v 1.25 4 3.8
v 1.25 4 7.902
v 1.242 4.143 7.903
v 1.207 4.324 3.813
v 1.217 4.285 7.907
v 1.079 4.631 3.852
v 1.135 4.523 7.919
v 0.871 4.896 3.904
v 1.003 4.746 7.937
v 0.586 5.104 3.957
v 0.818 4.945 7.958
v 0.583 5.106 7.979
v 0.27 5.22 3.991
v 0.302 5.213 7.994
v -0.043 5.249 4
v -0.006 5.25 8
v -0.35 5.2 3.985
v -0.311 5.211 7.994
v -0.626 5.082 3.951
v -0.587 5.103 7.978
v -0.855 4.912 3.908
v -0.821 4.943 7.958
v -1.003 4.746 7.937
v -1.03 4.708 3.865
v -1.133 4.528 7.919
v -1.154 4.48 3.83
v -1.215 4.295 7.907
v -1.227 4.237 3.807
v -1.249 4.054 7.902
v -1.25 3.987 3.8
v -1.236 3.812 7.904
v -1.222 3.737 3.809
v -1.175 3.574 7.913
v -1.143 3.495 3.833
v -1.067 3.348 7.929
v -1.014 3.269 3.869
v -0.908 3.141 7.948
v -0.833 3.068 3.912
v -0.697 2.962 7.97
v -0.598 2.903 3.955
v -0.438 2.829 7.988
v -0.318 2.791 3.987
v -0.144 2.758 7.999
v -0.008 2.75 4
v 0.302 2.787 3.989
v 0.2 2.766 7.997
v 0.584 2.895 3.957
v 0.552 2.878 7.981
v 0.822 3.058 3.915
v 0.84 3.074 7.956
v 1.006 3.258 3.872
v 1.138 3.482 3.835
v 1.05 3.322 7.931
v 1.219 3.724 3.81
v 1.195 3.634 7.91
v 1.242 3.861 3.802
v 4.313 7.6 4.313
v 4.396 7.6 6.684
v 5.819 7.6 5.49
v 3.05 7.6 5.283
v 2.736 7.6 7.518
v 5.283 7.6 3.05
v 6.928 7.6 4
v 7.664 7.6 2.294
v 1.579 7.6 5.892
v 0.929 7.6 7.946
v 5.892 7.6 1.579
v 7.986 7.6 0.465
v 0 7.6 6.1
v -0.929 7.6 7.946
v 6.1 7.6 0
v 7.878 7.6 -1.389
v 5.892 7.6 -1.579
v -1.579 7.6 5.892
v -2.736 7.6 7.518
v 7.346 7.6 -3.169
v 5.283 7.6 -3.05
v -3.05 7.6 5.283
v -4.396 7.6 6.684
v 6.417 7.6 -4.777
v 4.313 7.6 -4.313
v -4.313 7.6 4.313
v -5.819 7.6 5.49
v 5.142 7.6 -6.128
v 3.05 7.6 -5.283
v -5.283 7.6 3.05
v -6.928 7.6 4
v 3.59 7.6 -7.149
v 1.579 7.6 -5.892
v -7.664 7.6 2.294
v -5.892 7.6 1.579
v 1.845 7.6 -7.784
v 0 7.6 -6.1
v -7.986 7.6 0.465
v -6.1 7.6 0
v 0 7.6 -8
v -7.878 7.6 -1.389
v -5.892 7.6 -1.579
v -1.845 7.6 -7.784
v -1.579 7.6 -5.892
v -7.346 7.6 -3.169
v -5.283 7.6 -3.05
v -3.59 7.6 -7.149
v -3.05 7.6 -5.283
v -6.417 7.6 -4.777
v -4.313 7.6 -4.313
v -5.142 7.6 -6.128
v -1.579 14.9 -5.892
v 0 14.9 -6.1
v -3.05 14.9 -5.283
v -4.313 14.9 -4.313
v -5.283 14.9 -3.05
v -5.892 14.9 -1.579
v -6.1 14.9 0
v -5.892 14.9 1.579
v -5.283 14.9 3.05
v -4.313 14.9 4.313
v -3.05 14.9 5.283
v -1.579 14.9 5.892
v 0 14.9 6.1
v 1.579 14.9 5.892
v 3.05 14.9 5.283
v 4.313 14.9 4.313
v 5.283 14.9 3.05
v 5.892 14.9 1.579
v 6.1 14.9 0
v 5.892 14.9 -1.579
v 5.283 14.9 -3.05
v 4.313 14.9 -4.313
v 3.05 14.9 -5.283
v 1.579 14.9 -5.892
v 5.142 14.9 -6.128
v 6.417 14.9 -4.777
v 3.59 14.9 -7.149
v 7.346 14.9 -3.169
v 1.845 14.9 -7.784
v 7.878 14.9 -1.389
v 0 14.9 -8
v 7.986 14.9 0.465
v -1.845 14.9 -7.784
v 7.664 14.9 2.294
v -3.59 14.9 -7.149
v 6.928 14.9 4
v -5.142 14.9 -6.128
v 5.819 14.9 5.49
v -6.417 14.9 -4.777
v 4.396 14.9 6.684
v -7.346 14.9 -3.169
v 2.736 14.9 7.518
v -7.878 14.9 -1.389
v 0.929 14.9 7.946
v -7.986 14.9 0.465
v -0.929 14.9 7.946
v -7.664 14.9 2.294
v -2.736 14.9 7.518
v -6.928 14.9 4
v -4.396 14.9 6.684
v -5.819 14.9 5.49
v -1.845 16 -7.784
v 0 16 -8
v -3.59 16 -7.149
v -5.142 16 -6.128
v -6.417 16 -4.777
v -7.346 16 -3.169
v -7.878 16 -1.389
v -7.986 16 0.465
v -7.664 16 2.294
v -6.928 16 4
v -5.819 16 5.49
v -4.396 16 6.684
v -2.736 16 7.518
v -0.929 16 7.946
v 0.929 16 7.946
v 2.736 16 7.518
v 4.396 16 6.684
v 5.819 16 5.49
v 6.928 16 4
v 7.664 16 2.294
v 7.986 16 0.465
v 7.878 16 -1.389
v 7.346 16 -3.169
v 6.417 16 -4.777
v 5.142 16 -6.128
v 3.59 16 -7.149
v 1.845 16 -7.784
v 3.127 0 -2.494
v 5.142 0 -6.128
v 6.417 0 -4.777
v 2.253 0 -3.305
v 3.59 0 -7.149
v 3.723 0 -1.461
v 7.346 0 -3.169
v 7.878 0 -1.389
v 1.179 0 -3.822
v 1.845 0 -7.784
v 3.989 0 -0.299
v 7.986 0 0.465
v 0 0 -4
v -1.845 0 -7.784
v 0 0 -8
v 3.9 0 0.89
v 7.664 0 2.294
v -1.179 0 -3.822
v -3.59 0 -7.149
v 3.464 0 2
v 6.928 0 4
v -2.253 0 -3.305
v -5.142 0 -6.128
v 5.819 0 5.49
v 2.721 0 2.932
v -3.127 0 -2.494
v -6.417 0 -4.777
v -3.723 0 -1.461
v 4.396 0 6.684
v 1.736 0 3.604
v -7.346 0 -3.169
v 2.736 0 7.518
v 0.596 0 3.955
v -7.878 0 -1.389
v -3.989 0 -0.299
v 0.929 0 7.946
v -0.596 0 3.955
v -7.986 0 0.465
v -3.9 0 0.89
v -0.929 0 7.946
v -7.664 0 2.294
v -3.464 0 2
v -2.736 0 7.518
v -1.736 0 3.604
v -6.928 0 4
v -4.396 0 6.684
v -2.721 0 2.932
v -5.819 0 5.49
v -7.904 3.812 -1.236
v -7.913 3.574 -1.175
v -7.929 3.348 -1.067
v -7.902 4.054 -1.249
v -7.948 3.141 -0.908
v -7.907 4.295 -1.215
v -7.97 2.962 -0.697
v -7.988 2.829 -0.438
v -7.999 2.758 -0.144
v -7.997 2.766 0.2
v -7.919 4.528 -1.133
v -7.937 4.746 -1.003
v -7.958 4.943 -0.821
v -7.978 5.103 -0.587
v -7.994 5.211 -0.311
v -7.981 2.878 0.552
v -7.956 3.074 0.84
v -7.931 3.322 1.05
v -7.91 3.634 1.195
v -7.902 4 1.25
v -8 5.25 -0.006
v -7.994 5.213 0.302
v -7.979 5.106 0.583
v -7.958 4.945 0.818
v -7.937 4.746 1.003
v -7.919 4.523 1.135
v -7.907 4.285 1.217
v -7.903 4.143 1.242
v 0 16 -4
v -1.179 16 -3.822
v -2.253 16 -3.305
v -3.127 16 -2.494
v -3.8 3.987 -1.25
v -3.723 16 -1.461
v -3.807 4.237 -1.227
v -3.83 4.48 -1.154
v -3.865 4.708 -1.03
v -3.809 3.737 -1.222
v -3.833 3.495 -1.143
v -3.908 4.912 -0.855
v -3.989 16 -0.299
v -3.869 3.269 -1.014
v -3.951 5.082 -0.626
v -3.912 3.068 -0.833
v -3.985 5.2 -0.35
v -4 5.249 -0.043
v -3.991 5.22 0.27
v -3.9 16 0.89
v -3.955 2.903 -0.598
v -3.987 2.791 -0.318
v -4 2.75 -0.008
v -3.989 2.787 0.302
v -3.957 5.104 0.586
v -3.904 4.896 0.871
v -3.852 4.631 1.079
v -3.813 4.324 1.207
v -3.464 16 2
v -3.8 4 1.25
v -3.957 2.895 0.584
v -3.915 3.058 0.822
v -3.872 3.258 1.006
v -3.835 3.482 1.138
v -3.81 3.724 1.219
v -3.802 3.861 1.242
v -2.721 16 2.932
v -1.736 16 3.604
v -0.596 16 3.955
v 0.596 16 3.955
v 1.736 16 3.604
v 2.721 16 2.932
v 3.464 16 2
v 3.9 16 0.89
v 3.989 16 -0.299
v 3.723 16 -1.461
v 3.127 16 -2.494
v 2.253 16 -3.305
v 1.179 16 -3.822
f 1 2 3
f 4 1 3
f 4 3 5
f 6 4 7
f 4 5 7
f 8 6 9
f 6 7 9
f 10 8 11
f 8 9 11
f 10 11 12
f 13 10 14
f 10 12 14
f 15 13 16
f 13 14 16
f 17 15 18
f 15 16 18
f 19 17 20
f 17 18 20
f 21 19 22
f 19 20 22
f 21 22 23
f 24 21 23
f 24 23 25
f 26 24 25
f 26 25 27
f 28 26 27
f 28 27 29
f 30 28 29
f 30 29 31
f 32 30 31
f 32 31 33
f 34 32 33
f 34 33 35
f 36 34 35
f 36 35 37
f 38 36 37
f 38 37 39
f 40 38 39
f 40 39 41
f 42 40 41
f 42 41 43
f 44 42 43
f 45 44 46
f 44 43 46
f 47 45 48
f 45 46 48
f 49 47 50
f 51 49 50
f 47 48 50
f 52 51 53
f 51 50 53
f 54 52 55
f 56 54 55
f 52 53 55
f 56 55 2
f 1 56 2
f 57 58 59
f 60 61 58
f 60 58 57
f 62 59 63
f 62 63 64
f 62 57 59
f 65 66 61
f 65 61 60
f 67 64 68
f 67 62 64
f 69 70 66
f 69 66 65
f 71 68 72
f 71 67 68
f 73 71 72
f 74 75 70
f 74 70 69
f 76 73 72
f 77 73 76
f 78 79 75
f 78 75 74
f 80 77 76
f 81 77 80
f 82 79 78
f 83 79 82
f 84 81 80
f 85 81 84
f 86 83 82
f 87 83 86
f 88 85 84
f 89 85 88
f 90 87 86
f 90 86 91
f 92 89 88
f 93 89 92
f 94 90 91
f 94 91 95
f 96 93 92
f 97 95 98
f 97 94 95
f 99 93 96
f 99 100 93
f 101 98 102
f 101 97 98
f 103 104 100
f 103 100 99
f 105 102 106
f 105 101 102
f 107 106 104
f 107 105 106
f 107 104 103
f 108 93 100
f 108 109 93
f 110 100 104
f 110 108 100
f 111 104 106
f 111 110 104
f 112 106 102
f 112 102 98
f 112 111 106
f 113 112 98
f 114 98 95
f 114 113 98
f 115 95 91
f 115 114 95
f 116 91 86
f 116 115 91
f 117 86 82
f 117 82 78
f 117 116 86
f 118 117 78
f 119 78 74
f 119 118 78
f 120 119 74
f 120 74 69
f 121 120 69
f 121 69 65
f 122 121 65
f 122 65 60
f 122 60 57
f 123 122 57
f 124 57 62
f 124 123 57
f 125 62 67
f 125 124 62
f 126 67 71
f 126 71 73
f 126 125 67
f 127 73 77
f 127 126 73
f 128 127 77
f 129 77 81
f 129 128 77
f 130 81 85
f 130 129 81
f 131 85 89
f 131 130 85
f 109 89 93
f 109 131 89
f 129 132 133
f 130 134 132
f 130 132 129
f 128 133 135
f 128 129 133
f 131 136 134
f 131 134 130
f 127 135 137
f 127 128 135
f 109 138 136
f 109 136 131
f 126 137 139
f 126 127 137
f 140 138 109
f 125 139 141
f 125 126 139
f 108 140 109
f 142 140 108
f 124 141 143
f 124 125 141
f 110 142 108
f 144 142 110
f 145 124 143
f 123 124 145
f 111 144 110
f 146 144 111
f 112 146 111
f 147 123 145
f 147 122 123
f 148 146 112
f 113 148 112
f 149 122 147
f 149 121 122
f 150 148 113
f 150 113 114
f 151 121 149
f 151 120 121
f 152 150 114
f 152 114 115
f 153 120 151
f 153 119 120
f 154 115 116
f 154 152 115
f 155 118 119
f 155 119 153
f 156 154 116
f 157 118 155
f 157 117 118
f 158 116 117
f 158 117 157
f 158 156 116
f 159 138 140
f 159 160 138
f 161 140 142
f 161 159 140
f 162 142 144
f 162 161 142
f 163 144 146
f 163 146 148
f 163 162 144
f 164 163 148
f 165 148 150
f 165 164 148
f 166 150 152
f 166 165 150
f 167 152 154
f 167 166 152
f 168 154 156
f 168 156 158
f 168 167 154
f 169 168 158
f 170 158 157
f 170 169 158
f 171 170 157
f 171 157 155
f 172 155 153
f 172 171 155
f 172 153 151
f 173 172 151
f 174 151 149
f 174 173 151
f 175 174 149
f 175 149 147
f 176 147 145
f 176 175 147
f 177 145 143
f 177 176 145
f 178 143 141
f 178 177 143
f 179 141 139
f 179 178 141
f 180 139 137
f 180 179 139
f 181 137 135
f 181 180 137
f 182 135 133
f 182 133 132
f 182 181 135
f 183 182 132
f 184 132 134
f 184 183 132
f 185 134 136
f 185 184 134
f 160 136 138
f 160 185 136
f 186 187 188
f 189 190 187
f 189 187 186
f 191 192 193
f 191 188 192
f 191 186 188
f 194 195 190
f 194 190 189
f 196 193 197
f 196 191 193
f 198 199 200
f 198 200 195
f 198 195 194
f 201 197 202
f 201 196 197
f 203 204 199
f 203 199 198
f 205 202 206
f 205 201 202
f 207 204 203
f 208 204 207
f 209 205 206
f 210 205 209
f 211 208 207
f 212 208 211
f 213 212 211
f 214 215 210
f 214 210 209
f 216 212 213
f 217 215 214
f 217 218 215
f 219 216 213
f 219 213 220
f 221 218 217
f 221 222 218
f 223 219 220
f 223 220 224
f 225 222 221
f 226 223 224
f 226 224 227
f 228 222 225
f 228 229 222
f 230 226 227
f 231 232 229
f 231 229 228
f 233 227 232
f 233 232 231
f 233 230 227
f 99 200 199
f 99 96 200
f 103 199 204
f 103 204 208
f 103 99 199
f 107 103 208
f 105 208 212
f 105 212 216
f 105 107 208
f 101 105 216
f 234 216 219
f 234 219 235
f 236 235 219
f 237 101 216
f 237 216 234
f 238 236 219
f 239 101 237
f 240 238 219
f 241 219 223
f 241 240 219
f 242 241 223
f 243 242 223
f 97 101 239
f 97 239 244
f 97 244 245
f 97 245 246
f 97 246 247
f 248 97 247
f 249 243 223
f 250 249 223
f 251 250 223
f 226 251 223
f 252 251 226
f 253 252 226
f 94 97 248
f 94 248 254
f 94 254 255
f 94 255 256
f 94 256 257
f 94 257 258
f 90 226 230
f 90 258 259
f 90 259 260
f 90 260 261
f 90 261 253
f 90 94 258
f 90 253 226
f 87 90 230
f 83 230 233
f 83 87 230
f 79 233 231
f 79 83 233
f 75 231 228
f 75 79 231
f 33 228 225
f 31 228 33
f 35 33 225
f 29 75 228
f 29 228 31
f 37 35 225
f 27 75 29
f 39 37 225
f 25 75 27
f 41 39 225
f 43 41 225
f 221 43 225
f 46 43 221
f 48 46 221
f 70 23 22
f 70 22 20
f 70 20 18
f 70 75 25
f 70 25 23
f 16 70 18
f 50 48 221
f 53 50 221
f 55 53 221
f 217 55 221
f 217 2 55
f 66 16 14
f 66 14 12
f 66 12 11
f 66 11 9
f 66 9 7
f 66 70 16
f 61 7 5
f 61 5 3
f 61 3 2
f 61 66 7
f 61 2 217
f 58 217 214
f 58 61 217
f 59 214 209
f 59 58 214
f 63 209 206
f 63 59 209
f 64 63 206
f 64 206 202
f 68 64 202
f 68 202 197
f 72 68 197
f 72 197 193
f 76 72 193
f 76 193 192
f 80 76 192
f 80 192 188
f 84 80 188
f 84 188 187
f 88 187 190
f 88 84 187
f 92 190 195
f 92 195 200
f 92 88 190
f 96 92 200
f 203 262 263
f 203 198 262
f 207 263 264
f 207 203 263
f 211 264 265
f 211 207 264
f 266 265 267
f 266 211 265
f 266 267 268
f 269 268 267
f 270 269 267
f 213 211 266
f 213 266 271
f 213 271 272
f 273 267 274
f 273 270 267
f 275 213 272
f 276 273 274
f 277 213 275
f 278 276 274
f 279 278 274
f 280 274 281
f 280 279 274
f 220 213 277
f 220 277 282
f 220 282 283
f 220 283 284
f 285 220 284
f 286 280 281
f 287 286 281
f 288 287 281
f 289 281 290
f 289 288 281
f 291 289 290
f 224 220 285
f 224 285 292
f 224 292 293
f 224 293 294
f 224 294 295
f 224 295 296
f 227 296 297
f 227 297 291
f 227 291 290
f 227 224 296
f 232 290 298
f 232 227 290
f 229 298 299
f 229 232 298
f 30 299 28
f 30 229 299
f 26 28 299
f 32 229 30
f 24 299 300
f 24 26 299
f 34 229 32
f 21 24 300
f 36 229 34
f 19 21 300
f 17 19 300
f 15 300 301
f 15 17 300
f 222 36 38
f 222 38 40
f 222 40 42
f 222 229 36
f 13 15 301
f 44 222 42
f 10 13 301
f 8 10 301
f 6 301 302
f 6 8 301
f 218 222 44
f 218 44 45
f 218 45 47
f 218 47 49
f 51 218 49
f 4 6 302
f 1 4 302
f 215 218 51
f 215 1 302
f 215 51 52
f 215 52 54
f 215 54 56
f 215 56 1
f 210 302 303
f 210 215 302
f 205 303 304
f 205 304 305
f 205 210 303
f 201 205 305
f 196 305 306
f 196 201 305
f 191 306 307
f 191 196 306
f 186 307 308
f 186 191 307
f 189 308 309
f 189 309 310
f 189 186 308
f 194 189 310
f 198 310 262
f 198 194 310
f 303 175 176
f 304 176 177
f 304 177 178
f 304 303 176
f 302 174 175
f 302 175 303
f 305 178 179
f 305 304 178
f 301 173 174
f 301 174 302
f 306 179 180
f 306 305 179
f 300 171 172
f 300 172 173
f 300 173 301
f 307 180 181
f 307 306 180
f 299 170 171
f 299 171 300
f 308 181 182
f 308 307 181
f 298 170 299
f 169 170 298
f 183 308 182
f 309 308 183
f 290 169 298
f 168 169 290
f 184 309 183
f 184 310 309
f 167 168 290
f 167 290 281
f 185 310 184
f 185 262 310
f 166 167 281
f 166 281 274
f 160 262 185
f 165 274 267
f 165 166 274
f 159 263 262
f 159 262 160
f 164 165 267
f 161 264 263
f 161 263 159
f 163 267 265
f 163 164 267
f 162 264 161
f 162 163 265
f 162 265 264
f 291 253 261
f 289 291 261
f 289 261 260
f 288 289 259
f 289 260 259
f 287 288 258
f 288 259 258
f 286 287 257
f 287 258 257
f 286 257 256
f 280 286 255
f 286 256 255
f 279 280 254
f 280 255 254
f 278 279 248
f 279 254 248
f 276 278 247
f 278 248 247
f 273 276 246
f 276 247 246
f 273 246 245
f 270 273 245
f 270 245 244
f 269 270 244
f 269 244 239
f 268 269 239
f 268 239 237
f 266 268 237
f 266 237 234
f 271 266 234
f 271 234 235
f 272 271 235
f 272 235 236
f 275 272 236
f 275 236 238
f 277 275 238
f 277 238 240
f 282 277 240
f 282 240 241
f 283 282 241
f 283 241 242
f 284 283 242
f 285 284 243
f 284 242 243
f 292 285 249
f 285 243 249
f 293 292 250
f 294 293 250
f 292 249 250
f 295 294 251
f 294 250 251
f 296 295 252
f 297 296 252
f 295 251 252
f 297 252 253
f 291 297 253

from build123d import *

# Parameters (mm, degrees)
M3_GEWINDEBOHRUNG1_REACH  = 26
M3_GEWINDEBOHRUNG1_BORE_R = 1.25
KREISMUSTER1_COUNT        = 2
KREISMUSTER1_ANGLE        = 90


with BuildPart() as part:
    # Skizze1 → Rotation1 (revolve)
    with BuildSketch(Plane.XY, mode=Mode.PRIVATE) as rotation1_sk:
        Polygon((-4, 16), (-4, 0), (-8, 0), (-8, 7.6), (-6.1, 7.6), (-6.1, 14.9), (-8, 14.9), (-8, 16), align=None)
    revolve(rotation1_sk.sketch.rotate(Axis((0, 0, 0), (0, 1, 0)), 270), axis=Axis((0, 0, 0), (0, 1, 0)))

    # M3 Gewindebohrung1 bore → M3 Gewindebohrung1 (cut, up to next)
    with BuildSketch(Plane.XY.offset(8), mode=Mode.PRIVATE) as m3_gewindebohrung1_sk1:
        with Locations((0, 4)):
            Circle(M3_GEWINDEBOHRUNG1_BORE_R)
    m3_gewindebohrung1_tool1 = extrude(m3_gewindebohrung1_sk1.sketch, amount=-M3_GEWINDEBOHRUNG1_REACH, mode=Mode.PRIVATE) & part.part
    m3_gewindebohrung1 = m3_gewindebohrung1_tool1.solids().sort_by_distance((0, 4, 8))[0]
    add(m3_gewindebohrung1, mode=Mode.SUBTRACT)

    # Kreismuster1: M3 Gewindebohrung1 ×2 about axis
    kreismuster1_axis = Axis((0, 0, 0), (0, -1, 0))
    for i in range(1, KREISMUSTER1_COUNT):
        add(m3_gewindebohrung1.rotate(kreismuster1_axis, i * KREISMUSTER1_ANGLE / (KREISMUSTER1_COUNT - 1)), mode=Mode.SUBTRACT)


solid = part.part
